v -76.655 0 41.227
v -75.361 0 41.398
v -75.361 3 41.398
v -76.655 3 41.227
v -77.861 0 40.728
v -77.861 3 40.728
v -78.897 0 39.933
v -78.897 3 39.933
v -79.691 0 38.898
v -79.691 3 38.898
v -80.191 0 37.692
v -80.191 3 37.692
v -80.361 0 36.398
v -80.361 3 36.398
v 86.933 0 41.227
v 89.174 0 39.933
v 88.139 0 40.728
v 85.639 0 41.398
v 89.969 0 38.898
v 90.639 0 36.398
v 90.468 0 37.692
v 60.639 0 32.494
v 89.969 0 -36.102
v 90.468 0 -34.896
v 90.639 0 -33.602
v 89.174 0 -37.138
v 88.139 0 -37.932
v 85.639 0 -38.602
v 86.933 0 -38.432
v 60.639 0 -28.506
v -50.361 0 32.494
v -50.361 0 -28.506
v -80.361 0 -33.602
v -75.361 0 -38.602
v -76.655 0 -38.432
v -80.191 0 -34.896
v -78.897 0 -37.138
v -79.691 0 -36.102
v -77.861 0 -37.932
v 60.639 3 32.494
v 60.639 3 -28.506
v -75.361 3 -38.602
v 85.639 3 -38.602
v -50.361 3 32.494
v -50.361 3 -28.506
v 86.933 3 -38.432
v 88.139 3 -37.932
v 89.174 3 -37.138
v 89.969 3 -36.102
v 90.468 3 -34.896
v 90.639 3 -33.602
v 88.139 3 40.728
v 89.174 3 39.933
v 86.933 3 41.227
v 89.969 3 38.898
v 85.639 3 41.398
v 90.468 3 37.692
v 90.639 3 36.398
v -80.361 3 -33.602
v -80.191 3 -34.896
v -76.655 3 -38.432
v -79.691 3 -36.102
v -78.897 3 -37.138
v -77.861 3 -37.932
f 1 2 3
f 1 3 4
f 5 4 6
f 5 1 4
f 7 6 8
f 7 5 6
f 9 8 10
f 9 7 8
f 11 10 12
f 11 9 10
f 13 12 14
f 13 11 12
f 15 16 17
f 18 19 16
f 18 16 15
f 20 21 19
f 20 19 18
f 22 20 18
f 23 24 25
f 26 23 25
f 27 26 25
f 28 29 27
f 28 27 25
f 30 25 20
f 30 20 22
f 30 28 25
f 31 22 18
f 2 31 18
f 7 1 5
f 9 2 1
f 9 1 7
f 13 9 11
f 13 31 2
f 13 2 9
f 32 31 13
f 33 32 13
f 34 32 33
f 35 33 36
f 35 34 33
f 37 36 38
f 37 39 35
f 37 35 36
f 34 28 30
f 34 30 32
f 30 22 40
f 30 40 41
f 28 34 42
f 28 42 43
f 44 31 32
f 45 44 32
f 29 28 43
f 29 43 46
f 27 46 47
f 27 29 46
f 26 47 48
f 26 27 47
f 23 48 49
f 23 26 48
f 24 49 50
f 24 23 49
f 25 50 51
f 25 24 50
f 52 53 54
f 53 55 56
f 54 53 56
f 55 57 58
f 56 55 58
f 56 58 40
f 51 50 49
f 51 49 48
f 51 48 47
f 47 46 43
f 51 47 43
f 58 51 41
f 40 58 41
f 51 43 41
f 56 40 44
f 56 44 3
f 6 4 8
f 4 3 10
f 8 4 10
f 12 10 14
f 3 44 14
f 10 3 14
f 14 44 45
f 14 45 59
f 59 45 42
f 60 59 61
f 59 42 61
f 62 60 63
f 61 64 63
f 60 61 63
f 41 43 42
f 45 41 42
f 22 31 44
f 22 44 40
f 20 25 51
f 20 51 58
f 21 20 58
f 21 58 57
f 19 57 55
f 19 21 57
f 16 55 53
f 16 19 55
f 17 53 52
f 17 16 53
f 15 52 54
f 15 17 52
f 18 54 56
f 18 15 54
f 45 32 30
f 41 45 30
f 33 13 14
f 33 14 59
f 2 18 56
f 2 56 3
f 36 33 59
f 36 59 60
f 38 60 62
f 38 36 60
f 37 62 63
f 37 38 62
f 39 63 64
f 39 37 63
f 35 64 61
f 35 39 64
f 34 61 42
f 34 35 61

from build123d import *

# Parameters (mm, degrees)
BOSS_EXTRUDE1_DEPTH     = 3
CUT_EXTRUDE1_DEPTH      = 5
CUT_EXTRUDE1_DEPTH_BACK = 3
SKETCH2_W               = 111
SKETCH2_H               = 61


with BuildPart() as part:
    # Sketch1 → Boss-Extrude1 (new body)
    with BuildSketch(Plane(origin=(0, 0, 0), x_dir=(1, 0, 0), z_dir=(0, 1, 0))):
        with BuildLine():
            Line((-75.361284995, 38.602305476), (85.638715005, 38.602305476))
            ThreePointArc((85.638715005, 38.602305476), (89.174248911, 37.137839381), (90.638715005, 33.602305476))
            Line((90.638715005, 33.602305476), (90.638715005, -36.397694524))
            ThreePointArc((90.638715005, -36.397694524), (89.174248911, -39.93322843), (85.638715005, -41.397694524))
            Line((85.638715005, -41.397694524), (-75.361284995, -41.397694524))
            ThreePointArc((-75.361284995, -41.397694524), (-78.896818901, -39.93322843), (-80.361284995, -36.397694524))
            Line((-80.361284995, -36.397694524), (-80.361284995, 33.602305476))
            ThreePointArc((-80.361284995, 33.602305476), (-78.896818901, 37.137839381), (-75.361284995, 38.602305476))
        make_face()
    extrude(amount=BOSS_EXTRUDE1_DEPTH)

    # Sketch2 → Cut-Extrude1 (cut, two sides: drawn at the far end of the back side and taken through both)
    with BuildSketch(Plane(origin=(0, 0, 0), x_dir=(1, 0, 0), z_dir=(0, 1, 0)).offset(-CUT_EXTRUDE1_DEPTH_BACK)):
        with Locations((5.138715005, -1.994135041)):
            Rectangle(SKETCH2_W, SKETCH2_H)
    extrude(amount=CUT_EXTRUDE1_DEPTH + CUT_EXTRUDE1_DEPTH_BACK, mode=Mode.SUBTRACT)


solid = part.part
